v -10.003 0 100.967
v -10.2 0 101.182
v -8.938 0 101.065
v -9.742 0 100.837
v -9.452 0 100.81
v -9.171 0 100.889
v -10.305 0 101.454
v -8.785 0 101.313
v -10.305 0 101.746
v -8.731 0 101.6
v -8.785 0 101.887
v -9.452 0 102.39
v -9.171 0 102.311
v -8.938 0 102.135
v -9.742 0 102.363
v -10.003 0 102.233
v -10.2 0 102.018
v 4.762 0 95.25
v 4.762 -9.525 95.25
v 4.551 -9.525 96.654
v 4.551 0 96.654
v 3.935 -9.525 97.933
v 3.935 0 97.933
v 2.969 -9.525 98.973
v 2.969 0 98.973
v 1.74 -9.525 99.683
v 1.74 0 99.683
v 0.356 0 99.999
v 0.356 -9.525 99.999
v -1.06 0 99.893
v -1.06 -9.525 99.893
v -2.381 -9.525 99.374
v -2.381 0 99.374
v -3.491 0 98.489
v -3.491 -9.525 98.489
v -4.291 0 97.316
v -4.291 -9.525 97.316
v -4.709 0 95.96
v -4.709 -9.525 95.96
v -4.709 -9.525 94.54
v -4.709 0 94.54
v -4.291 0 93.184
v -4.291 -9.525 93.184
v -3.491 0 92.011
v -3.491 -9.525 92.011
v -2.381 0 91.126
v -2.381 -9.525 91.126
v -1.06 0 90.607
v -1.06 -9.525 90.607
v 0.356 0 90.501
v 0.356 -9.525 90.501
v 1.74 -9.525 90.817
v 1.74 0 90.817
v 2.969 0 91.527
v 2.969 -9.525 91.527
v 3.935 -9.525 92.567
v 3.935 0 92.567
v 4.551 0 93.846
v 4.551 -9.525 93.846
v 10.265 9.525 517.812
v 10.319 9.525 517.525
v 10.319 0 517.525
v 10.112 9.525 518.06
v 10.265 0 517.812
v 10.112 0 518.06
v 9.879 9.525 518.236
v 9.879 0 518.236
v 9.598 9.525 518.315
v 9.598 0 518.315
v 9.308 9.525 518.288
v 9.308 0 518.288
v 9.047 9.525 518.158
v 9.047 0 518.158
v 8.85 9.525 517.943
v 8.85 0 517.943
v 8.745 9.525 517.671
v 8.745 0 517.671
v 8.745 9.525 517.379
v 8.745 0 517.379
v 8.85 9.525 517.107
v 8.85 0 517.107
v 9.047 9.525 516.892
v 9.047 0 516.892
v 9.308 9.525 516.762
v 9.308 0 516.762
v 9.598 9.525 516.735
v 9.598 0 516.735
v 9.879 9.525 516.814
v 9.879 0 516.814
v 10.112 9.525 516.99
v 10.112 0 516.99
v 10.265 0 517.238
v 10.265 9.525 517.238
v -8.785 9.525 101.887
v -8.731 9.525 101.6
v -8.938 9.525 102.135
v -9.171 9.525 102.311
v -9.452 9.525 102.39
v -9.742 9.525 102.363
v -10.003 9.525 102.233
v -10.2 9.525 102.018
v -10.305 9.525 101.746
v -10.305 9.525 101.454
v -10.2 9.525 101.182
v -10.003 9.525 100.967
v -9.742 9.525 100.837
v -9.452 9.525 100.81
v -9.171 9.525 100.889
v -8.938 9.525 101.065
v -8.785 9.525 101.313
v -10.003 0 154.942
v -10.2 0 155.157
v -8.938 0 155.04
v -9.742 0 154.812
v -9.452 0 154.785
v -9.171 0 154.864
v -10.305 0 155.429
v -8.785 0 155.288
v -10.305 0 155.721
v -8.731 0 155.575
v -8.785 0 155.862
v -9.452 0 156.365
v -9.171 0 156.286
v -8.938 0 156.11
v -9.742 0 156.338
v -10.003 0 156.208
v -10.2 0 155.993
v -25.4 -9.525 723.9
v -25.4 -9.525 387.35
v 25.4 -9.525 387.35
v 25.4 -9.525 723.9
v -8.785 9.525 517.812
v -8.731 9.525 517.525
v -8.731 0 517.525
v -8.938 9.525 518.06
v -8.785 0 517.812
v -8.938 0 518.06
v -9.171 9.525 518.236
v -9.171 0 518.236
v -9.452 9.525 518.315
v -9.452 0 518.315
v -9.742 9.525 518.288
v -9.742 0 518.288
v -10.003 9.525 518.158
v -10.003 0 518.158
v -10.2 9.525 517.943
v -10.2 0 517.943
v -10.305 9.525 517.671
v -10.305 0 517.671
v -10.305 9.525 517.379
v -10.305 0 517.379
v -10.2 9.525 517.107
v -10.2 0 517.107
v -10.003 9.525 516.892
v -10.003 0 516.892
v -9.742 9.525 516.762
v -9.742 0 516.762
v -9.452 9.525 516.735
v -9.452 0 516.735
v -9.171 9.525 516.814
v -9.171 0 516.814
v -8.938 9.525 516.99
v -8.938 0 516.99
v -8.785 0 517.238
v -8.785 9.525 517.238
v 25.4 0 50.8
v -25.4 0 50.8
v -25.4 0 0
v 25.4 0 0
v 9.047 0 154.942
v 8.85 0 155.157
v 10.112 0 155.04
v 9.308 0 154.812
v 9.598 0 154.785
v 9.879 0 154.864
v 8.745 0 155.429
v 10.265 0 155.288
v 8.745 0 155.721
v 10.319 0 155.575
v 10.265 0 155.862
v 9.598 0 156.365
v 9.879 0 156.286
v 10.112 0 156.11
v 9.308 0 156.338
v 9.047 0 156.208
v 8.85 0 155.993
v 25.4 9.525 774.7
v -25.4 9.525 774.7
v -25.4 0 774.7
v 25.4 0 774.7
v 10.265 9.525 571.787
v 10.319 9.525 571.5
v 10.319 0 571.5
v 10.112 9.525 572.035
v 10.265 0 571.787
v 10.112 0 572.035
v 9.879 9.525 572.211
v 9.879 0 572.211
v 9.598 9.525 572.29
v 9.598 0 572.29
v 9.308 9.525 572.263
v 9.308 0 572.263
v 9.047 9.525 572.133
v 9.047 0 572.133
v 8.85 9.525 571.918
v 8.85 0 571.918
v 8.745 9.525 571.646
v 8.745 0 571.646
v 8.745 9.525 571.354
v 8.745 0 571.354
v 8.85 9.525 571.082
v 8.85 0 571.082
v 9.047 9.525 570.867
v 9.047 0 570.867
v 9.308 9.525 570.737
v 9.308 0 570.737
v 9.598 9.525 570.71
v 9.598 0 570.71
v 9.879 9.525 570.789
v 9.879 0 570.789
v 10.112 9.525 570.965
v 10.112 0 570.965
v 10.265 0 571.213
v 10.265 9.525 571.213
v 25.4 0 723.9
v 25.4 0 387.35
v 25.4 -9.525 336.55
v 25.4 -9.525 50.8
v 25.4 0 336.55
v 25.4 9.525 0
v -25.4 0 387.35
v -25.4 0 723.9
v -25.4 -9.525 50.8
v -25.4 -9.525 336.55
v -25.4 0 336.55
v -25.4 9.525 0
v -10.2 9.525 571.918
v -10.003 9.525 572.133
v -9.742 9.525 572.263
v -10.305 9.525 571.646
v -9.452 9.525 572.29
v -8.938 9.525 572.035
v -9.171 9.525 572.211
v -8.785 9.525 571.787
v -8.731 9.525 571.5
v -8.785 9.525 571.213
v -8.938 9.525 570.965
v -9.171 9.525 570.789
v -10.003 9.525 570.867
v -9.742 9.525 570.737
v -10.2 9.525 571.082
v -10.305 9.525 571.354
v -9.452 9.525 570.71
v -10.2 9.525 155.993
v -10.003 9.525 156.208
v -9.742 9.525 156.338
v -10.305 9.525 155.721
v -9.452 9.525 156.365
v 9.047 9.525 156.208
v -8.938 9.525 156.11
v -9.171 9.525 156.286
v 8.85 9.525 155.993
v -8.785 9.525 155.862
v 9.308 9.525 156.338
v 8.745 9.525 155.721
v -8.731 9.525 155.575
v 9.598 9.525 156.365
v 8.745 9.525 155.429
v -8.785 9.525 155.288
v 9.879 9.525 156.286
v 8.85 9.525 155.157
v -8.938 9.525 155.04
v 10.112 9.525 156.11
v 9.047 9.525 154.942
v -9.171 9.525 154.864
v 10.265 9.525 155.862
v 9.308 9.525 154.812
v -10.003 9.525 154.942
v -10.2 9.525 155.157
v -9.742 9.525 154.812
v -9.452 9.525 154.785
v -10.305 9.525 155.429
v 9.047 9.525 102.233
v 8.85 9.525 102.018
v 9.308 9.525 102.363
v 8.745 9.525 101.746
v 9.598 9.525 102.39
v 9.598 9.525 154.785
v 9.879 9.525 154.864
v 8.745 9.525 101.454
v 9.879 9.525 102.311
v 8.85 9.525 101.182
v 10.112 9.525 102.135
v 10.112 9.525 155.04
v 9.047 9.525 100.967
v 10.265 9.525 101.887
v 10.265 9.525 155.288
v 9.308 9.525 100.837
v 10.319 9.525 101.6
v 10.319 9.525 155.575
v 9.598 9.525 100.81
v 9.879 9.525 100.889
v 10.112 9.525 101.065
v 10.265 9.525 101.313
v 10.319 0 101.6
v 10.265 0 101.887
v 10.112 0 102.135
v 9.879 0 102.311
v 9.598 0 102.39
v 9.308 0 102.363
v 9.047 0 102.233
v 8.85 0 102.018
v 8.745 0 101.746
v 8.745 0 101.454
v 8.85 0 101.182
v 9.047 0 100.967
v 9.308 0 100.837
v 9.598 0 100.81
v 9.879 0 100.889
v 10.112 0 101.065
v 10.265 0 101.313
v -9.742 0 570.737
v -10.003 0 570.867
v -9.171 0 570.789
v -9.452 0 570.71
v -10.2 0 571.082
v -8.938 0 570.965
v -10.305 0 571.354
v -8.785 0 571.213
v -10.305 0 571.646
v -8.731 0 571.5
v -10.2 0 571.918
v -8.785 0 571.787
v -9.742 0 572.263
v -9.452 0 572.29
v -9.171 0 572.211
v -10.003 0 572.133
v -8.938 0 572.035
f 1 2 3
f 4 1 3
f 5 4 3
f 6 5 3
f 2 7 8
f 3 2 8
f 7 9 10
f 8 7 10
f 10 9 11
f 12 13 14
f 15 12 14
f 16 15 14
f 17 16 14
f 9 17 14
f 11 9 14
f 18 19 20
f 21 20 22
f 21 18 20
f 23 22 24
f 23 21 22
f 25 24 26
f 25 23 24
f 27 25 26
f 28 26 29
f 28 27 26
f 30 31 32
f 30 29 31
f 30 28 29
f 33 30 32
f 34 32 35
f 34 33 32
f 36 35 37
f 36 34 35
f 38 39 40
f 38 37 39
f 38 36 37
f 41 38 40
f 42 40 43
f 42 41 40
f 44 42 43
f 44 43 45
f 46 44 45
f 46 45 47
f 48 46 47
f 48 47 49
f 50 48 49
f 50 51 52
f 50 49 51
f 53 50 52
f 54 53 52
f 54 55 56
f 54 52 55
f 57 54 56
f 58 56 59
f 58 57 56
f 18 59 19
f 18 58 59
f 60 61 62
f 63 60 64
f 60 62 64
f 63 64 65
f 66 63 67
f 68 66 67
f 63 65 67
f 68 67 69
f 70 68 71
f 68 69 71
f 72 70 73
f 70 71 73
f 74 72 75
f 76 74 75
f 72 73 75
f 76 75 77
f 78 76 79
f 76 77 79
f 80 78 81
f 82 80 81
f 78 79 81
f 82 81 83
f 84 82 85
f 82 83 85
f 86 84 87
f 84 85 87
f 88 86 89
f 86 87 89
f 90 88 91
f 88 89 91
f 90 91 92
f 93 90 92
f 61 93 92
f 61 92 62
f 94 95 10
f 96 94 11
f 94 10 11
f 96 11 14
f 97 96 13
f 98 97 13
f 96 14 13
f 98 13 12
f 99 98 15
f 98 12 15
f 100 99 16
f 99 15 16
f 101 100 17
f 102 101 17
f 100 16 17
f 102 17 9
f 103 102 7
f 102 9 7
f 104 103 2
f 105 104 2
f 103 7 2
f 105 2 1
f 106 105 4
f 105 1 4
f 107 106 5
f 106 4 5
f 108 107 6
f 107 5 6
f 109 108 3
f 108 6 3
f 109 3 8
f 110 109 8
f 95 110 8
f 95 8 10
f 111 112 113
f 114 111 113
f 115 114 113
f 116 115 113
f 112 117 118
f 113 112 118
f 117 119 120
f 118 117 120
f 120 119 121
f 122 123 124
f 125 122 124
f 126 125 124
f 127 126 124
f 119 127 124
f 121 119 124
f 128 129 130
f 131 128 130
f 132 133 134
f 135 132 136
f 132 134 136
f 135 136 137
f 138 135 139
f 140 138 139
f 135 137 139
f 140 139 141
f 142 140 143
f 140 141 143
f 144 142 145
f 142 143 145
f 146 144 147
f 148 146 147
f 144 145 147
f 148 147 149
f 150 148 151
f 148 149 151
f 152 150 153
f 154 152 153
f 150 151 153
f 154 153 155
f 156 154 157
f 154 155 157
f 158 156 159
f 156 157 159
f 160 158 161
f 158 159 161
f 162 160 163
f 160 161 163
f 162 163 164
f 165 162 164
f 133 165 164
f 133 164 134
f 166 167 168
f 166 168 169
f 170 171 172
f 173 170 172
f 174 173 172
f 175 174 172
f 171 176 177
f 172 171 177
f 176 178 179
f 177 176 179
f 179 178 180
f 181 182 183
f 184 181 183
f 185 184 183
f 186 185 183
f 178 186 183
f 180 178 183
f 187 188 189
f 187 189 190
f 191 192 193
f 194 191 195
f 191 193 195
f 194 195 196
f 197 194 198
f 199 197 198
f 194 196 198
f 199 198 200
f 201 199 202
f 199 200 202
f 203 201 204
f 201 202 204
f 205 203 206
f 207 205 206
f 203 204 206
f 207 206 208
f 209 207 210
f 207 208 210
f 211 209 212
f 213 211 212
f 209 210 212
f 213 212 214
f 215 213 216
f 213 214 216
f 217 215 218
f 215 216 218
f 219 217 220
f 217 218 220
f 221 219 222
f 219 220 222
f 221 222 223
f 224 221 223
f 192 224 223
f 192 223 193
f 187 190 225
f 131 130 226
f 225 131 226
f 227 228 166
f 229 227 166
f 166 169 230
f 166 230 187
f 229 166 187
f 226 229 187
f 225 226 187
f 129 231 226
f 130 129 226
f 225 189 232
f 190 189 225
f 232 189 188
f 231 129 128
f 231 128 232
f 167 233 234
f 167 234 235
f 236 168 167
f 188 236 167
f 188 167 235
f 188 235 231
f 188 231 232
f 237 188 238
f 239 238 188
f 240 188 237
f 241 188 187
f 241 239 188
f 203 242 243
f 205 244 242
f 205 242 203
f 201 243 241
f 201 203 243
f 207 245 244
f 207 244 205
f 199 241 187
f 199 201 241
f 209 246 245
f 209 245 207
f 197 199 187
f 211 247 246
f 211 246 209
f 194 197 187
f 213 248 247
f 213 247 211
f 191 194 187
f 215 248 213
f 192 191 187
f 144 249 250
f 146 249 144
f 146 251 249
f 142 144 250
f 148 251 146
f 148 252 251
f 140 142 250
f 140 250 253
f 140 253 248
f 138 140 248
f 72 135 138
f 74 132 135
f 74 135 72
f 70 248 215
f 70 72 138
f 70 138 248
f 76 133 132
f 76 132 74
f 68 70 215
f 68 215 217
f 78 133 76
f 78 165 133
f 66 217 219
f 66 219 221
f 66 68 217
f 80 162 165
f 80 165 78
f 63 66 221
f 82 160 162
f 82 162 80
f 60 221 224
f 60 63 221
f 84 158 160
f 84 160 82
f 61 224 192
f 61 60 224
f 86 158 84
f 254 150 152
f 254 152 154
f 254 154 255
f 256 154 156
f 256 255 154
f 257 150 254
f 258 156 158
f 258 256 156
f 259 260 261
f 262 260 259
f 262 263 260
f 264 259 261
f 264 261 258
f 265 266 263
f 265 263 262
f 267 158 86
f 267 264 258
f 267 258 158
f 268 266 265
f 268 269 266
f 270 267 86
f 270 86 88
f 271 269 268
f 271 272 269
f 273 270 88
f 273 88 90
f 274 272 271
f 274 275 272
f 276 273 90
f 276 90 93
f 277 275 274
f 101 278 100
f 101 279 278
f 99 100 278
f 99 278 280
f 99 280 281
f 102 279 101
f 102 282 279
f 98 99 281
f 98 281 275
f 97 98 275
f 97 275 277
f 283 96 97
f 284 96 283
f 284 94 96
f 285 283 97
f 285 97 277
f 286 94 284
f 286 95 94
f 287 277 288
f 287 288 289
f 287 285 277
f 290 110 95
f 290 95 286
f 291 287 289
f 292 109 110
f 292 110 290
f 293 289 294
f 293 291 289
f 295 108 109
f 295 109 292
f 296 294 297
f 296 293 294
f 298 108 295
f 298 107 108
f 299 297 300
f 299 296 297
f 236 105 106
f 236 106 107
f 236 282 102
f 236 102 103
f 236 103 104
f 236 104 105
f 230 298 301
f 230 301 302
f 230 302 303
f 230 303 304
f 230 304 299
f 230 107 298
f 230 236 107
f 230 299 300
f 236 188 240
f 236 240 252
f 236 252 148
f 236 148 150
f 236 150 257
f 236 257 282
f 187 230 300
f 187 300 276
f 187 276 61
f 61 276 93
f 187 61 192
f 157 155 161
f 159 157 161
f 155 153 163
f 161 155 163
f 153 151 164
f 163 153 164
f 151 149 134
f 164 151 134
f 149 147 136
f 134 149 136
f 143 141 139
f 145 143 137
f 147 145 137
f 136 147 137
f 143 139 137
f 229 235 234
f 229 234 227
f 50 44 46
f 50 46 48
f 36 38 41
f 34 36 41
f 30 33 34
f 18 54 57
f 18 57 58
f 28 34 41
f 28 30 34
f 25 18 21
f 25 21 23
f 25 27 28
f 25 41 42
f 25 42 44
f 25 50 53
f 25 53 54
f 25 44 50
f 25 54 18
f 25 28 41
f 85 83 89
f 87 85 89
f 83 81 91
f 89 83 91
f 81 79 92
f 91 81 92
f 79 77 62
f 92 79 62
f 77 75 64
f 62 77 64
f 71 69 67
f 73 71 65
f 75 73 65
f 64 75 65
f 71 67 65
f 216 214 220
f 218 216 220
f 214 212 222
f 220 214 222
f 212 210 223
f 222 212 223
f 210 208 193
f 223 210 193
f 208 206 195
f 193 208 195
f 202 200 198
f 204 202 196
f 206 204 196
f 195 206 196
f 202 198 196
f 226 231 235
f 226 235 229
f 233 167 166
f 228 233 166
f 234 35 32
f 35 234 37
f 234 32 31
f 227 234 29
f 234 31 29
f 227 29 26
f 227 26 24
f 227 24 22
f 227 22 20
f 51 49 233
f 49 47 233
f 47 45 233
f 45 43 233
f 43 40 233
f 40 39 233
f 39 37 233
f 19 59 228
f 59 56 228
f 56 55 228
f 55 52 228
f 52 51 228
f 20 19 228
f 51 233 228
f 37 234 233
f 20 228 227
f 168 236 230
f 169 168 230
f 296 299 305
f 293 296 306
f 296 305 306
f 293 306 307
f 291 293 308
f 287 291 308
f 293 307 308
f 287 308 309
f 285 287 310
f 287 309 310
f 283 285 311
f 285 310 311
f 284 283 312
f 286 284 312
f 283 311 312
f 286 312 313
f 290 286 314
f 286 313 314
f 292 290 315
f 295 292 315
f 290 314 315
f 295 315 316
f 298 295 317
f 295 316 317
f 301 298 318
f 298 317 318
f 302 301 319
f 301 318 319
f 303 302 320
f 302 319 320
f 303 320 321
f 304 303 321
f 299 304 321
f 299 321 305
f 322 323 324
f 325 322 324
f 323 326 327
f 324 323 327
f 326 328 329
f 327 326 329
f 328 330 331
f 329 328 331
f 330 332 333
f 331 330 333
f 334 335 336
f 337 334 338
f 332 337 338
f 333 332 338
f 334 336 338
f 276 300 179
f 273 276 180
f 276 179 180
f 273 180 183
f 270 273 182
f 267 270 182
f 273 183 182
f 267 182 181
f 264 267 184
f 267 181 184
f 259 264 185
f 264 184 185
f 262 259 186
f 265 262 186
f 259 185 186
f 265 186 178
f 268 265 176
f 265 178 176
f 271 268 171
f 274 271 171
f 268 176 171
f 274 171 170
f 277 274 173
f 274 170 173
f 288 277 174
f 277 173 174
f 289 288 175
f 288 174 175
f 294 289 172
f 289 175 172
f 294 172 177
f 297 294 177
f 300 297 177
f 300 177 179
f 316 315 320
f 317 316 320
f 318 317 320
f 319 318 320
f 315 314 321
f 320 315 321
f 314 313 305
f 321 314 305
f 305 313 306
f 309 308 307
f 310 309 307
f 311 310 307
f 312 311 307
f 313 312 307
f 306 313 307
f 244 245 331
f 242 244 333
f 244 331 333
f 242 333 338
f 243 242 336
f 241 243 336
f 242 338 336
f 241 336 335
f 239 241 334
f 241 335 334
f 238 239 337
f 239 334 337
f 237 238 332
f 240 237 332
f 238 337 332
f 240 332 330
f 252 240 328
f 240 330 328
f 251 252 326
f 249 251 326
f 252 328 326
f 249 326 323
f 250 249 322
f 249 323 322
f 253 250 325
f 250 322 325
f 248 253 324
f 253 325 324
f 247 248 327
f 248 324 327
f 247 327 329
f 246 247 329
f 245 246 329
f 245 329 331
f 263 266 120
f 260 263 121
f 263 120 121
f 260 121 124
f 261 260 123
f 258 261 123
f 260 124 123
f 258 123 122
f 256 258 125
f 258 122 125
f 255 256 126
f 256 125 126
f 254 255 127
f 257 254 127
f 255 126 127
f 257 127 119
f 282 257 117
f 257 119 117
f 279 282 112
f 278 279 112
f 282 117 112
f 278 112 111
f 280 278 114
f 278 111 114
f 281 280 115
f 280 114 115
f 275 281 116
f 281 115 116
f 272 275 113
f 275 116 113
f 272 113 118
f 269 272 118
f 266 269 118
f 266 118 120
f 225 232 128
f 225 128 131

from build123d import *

# Parameters (mm, degrees)
F0_W     = 50.8
F0_H     = 19.05
F1_DEPTH = 774.7
F2_W     = 122.43557321
F2_H     = 50.8
F2_W_2   = 343.1604206562
F2_W_3   = 296.3738366961
F3_DEPTH = 25.4
F4_R     = 0.79375
F5_DEPTH = 25.4
F6_R     = 4.7625
F7_DEPTH = 25.4


# Not quite as in the source:
# - a feature names something its author has since deleted; it is built from what else it names


with BuildPart() as f1:
    # F0 (on Top) → F1 (new body)
    with BuildSketch(Plane.XY):
        Rectangle(F0_W, F0_H)
    extrude(amount=F1_DEPTH)

    # F2 (on Front) → F3 (cut)
    with BuildSketch(Plane.XZ):
        with Locations((22.4465244144, 25.4)):
            Rectangle(F2_W, F2_H)
        with Locations((-38.7818217278, 749.3)):
            Rectangle(F2_W_2, F2_H)
        with Locations((-46.0684634745, 361.95)):
            Rectangle(F2_W_3, F2_H)
    extrude(amount=F3_DEPTH, mode=Mode.SUBTRACT)

    # F4 (on Front) → F5 (cut)
    with BuildSketch(Plane.XZ):
        with Locations((9.525, 101.6)):
            Circle(F4_R)
        with Locations((9.525, 155.575)):
            Circle(F4_R)
        with Locations((9.525, 517.525)):
            Circle(F4_R)
        with Locations((9.525, 571.5)):
            Circle(F4_R)
        with Locations((-9.525, 517.525)):
            Circle(F4_R)
        with Locations((-9.525, 571.5)):
            Circle(F4_R)
        with Locations((-9.525, 101.6)):
            Circle(F4_R)
        with Locations((-9.525, 155.575)):
            Circle(F4_R)
    extrude(amount=-F5_DEPTH, mode=Mode.SUBTRACT)

    # F6 (on Front) → F7 (cut)
    with BuildSketch(Plane.XZ):
        with Locations((0, 95.25)):
            Circle(F6_R)
        with Locations((0, 361.95)):
            Circle(F6_R)
    extrude(amount=F7_DEPTH, mode=Mode.SUBTRACT)


solid = f1.part
